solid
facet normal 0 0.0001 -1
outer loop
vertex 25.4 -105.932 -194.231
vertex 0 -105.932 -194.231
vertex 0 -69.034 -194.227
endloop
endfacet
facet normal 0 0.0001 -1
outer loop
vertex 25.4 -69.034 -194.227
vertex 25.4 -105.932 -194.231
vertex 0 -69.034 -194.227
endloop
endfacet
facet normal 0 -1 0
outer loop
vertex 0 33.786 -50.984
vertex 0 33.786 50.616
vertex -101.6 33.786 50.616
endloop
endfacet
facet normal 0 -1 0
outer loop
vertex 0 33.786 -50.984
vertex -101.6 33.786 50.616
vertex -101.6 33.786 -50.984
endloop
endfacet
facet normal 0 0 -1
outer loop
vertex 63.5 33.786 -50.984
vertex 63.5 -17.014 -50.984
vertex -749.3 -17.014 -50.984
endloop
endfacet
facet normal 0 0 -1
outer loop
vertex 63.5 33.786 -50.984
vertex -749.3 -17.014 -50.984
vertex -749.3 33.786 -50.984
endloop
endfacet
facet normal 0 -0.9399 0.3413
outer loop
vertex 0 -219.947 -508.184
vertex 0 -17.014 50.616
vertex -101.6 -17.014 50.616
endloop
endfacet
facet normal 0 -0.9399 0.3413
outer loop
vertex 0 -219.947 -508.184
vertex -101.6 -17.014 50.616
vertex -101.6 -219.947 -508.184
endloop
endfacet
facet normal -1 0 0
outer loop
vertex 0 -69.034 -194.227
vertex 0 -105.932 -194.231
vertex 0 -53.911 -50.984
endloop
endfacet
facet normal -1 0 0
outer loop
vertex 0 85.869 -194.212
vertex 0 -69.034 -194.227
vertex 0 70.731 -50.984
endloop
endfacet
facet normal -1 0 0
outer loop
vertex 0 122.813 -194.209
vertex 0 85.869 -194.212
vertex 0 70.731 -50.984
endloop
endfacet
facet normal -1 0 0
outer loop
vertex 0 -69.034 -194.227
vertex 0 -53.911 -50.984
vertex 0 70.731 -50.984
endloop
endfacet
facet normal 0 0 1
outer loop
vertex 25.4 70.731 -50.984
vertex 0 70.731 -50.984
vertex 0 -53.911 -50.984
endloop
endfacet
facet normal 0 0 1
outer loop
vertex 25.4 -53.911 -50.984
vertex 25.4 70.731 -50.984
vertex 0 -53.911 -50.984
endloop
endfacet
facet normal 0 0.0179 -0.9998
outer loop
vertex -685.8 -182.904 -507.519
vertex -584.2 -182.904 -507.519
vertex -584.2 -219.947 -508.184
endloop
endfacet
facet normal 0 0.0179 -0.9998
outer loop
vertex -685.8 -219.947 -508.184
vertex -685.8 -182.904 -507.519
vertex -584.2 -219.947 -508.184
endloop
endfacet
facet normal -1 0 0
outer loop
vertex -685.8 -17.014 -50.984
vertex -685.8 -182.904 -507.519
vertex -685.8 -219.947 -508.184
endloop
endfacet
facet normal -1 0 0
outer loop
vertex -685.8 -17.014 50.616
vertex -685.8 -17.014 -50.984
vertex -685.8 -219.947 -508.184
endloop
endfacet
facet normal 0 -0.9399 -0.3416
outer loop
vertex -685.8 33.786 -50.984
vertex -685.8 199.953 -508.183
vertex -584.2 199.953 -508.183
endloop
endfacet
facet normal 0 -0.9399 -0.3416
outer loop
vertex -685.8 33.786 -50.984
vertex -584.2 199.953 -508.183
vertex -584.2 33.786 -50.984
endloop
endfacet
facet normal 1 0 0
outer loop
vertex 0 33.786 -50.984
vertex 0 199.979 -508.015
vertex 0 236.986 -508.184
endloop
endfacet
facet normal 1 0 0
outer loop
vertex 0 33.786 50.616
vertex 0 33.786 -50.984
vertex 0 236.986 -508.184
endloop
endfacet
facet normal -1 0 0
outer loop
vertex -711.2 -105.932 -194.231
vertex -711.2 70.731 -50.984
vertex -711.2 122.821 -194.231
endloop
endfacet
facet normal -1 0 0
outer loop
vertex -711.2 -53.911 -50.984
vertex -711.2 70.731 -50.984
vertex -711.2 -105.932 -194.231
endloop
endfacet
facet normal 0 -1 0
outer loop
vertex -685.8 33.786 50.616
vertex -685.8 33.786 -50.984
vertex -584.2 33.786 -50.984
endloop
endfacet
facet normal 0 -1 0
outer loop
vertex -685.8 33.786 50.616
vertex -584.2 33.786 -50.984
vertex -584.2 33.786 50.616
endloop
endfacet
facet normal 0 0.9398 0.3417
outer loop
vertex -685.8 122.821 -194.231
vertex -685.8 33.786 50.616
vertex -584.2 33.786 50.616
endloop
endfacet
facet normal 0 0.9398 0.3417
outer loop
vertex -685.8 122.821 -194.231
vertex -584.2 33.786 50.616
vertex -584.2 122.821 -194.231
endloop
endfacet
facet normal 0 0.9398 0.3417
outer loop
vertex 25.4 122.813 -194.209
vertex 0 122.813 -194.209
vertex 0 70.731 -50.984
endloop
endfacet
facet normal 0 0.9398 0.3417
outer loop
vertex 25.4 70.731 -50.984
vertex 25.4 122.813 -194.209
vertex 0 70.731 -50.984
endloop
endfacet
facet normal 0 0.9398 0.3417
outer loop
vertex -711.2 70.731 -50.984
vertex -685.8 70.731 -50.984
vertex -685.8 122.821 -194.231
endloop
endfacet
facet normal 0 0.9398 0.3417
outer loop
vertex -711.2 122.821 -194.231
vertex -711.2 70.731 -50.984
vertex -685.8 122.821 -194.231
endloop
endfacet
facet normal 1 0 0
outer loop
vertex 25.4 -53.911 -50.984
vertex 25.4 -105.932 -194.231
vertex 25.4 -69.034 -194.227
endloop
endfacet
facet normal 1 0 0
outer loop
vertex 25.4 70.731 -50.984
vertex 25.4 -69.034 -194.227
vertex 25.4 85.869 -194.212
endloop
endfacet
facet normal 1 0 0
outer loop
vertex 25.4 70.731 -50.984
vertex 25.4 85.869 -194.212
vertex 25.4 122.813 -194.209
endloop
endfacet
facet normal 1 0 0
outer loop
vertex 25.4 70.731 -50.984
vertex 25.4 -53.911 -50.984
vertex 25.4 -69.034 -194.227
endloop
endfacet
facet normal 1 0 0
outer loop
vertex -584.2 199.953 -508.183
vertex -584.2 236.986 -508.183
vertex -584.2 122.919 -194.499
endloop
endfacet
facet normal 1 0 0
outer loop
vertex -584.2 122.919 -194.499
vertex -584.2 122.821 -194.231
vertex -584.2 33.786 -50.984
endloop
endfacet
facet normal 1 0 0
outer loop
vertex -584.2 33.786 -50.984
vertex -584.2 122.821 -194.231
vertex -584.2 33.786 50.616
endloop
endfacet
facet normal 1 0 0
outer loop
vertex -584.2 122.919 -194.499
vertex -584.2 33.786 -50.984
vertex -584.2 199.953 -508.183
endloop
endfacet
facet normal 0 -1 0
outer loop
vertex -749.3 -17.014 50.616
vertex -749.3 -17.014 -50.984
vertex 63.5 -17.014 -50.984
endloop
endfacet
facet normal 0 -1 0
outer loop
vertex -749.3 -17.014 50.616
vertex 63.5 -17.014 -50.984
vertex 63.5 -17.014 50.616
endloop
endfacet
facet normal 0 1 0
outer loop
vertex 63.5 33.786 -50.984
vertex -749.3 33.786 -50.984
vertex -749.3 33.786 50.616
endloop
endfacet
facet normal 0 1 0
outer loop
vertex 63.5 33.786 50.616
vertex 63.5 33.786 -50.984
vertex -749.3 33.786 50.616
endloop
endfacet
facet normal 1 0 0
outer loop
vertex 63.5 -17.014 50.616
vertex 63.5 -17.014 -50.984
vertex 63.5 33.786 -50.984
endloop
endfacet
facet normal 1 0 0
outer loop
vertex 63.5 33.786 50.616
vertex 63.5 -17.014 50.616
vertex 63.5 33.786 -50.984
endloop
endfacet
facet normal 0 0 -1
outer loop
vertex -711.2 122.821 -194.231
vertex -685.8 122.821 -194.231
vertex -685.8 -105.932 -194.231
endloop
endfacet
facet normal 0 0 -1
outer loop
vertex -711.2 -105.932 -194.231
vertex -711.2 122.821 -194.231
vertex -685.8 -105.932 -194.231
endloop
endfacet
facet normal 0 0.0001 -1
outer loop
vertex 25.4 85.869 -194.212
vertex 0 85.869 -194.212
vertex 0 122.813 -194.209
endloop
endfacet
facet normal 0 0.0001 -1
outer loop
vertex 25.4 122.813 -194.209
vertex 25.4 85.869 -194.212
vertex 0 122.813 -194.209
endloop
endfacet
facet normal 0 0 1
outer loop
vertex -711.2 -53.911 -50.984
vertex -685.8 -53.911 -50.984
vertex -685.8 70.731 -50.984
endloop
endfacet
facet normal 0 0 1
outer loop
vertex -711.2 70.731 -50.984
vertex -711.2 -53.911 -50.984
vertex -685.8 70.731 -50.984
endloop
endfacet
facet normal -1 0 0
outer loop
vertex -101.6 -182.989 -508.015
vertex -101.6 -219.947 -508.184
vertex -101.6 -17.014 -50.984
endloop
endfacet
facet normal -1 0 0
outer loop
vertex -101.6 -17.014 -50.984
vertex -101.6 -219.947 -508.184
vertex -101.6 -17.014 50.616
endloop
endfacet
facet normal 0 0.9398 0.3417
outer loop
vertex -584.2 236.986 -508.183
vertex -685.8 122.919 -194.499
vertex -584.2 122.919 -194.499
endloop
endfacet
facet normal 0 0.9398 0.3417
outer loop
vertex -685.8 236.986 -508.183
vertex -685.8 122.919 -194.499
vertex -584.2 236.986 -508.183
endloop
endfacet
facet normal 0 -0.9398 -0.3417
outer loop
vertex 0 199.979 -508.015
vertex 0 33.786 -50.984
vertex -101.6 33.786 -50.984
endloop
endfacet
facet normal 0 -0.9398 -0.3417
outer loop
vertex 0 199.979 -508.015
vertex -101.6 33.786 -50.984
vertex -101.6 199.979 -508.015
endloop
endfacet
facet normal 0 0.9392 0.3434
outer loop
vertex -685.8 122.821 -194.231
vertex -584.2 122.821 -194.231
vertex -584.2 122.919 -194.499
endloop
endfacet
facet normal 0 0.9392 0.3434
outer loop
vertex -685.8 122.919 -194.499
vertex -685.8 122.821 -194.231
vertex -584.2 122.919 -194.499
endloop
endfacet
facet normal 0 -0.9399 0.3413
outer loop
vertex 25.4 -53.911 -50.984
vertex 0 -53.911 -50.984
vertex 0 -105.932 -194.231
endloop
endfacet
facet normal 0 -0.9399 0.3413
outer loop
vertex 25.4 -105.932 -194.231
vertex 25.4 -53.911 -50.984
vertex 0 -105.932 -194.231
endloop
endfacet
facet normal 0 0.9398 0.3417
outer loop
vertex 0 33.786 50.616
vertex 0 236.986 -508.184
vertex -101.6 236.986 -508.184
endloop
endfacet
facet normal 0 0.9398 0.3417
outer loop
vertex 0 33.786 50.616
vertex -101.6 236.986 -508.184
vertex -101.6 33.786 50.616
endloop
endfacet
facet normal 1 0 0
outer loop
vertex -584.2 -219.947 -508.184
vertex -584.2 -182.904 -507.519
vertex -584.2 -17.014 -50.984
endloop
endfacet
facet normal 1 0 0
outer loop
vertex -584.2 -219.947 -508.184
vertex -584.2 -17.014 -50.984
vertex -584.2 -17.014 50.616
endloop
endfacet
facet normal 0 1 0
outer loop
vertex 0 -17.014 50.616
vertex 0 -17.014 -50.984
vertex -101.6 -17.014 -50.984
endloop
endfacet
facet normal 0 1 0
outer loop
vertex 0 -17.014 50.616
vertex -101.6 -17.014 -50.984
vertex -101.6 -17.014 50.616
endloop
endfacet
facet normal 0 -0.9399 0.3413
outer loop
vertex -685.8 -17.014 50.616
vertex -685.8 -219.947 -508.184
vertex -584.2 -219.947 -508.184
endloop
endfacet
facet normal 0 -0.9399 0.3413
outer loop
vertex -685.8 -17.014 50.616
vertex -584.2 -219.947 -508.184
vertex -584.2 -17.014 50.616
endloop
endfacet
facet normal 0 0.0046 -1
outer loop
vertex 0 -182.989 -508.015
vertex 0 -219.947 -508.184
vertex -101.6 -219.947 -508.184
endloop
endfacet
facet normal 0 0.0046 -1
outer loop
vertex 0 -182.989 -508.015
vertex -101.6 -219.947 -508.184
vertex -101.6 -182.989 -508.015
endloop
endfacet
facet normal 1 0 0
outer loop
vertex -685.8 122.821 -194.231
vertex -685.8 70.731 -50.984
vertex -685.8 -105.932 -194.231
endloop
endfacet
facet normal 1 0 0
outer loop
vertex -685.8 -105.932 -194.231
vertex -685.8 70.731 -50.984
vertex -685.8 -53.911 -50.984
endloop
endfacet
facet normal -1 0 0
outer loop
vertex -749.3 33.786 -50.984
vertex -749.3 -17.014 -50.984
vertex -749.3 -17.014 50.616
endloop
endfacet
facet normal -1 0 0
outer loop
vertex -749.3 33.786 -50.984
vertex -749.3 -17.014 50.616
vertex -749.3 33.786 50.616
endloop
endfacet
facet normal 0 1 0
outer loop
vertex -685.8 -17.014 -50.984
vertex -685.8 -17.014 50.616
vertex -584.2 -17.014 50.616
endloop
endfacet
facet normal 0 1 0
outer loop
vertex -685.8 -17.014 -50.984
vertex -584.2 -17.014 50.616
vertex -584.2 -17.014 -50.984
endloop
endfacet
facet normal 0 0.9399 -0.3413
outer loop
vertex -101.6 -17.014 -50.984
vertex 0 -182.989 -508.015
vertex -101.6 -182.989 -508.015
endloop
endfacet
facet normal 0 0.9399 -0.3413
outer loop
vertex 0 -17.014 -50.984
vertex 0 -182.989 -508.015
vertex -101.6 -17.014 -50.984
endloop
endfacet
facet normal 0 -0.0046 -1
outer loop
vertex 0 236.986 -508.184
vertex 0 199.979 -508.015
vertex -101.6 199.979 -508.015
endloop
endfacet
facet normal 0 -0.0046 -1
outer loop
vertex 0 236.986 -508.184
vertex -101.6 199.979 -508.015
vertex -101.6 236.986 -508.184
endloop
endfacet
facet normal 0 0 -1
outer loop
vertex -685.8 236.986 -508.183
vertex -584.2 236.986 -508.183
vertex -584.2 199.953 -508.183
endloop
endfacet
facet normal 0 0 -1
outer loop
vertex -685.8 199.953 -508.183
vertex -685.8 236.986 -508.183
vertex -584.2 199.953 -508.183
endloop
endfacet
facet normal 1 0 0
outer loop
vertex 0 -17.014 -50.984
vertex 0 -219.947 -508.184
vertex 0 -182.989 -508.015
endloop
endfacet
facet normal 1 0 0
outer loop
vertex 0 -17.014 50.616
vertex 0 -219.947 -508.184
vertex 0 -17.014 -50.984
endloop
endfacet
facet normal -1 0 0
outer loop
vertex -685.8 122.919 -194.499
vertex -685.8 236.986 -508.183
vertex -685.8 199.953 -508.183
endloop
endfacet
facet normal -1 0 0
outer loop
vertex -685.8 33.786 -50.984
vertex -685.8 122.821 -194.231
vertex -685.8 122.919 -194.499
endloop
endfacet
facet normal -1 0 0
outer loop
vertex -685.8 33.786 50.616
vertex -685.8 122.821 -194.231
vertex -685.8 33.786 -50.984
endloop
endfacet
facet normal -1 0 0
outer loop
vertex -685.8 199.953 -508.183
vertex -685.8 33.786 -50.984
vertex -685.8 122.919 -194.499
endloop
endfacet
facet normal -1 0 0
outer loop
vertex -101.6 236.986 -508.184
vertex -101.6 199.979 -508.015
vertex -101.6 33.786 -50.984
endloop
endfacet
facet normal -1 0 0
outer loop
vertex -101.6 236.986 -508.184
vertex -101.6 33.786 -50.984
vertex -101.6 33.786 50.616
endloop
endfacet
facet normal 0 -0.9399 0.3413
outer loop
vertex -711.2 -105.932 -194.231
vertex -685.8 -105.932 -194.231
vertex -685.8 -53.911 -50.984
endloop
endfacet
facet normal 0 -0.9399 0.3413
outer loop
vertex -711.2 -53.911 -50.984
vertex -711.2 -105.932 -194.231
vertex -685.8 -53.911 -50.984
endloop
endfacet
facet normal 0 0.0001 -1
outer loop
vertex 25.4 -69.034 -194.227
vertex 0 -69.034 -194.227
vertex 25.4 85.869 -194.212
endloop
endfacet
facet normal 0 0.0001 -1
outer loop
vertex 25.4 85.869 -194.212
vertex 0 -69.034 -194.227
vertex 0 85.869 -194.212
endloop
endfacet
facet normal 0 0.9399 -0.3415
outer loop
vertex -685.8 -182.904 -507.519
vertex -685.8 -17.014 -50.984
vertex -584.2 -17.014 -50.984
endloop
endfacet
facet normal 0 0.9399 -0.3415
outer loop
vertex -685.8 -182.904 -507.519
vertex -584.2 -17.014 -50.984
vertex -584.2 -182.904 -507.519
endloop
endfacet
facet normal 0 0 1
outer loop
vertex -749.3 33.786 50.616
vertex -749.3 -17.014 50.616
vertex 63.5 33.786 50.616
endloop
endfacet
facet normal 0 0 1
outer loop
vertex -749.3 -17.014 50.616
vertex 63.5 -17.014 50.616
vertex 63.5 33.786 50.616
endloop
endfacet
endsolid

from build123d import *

# Parameters (mm, degrees)
F0_W     = 50.8
F0_H     = 101.6
F1_DEPTH = 63.5
F2_DEPTH = 101.6
F3_DEPTH = 685.8
F4_DEPTH = 25.4
F6_DEPTH = 101.6
F7_DEPTH = 63.5
F8_DEPTH = 25.4


with BuildPart() as f1:
    # F0 (on Right) → F1 (new body)
    with BuildSketch(Plane.YZ):
        with Locations((8.3857368908, -0.1843553036)):
            Rectangle(F0_W, F0_H)
    extrude(amount=F1_DEPTH)

    # F0 (on Right) → F3 (join)
    with BuildSketch(Plane.YZ):
        with Locations((8.3857368908, -0.1843553036)):
            Rectangle(F0_W, F0_H)
    extrude(amount=-F3_DEPTH)

    # F7 (add): a face of the model
    f7_faces = [f1.faces().sort_by_distance(p)[0] for p in [
        (-685.8, 8.3857368908, -0.1843553036),
    ]]
    extrude(f7_faces, amount=F7_DEPTH)


with BuildPart() as f2:
    # F0 (on Right) → F2 (new body)
    with BuildSketch(Plane.YZ):
        Polygon((70.7311914363, -50.9843553036), (33.7857368908, 50.6156446964), (33.7857368908, -50.9843553036), align=None)
        Polygon((122.8128342507, -194.2088730433), (85.8686692533, -194.2124193003), (199.9787119015, -508.0150365829), (236.9857368908, -508.1843553036), align=None)
        Polygon((70.7311914363, -50.9843553036), (33.7857368908, -50.9843553036), (85.8686692533, -194.2124193003), (122.8128342507, -194.2088730433), align=None)
    extrude(amount=-F2_DEPTH)


with BuildPart() as f2b:
    # F0 (on Right) → F2, piece 2 (new body)
    with BuildSketch(Plane.YZ):
        Polygon((-182.9889863729, -508.0150365829), (-69.0341977637, -194.2272883706), (-105.9324202058, -194.2308302176), (-219.9474121489, -508.1843553036), align=None)
        Polygon((-69.0341977637, -194.2272883706), (-17.0142631092, -50.9843553036), (-53.9111992982, -50.9843553036), (-105.9324202058, -194.2308302176), align=None)
        Polygon((-17.0142631092, -50.9843553036), (-17.0142631092, 50.6156446964), (-53.9111992982, -50.9843553036), align=None)
    extrude(amount=-F2_DEPTH)


with BuildPart() as f4:
    # F0 (on Right) → F4 (new body)
    with BuildSketch(Plane.YZ):
        Polygon((33.7857368908, -50.9843553036), (-17.0142631092, -50.9843553036), (-69.0341977637, -194.2272883706), (85.8686692533, -194.2124193003), align=None)
        Polygon((-69.0341977637, -194.2272883706), (-17.0142631092, -50.9843553036), (-53.9111992982, -50.9843553036), (-105.9324202058, -194.2308302176), align=None)
        Polygon((70.7311914363, -50.9843553036), (33.7857368908, -50.9843553036), (85.8686692533, -194.2124193003), (122.8128342507, -194.2088730433), align=None)
    extrude(amount=F4_DEPTH)


with BuildPart() as f6:
    # F5 (on face) → F6 (new body)
    with BuildSketch(Plane(origin=(-685.8, 0, 0), x_dir=(0, -1, 0), z_dir=(-1, 0, 0))):
        Polygon((53.9111994149, -50.9843553036), (17.0142631092, 50.6156446964), (17.0142631092, -50.9843553036), align=None)
        Polygon((53.9111994149, -50.9843553036), (17.0142631092, -50.9843553036), (69.0654225647, -194.2308301649), (105.9324204678, -194.2308301649), align=None)
        Polygon((105.9324204678, -194.2308301649), (69.0654225647, -194.2308301649), (182.904193447, -507.5188107205), (219.9473977089, -508.1843137741), align=None)
    extrude(amount=-F6_DEPTH)


with BuildPart() as f6b:
    # F5 (on face) → F6, piece 2 (new body)
    with BuildSketch(Plane(origin=(-685.8, 0, 0), x_dir=(0, -1, 0), z_dir=(-1, 0, 0))):
        Polygon((-33.7857368908, -50.9843553036), (-33.7857368908, 50.6156446964), (-70.7313324906, -50.9843553036), align=None)
        Polygon((-85.8481806419, -194.2308301649), (-33.7857368908, -50.9843553036), (-70.7313324906, -50.9843553036), (-122.8211585863, -194.2308301649), align=None)
        Polygon((-199.9530941248, -508.1831812859), (-85.8481806419, -194.2308301649), (-122.8211585863, -194.2308301649), (-122.9187960073, -194.4993320474), (-236.9860857725, -508.1831812859), align=None)
    extrude(amount=-F6_DEPTH)


with BuildPart() as f8:
    # F5 (on face) → F8 (new body)
    with BuildSketch(Plane(origin=(-685.8, 0, 0), x_dir=(0, -1, 0), z_dir=(-1, 0, 0))):
        Polygon((-12.7845484928, -194.2308301649), (-10.2110409268, -50.9843553036), (-33.7857368908, -50.9843553036), (-85.8481806419, -194.2308301649), align=None)
        Polygon((-85.8481806419, -194.2308301649), (-33.7857368908, -50.9843553036), (-70.7313324906, -50.9843553036), (-122.8211585863, -194.2308301649), align=None)
        Polygon((17.0142631092, -50.9843553036), (-10.2110409268, -50.9843553036), (-12.7845484928, -194.2308301649), (69.0654225647, -194.2308301649), align=None)
        Polygon((53.9111994149, -50.9843553036), (17.0142631092, -50.9843553036), (69.0654225647, -194.2308301649), (105.9324204678, -194.2308301649), align=None)
    extrude(amount=F8_DEPTH)


solid = Compound([f1.part, f2.part, f2b.part, f4.part, f6.part, f6b.part, f8.part])
